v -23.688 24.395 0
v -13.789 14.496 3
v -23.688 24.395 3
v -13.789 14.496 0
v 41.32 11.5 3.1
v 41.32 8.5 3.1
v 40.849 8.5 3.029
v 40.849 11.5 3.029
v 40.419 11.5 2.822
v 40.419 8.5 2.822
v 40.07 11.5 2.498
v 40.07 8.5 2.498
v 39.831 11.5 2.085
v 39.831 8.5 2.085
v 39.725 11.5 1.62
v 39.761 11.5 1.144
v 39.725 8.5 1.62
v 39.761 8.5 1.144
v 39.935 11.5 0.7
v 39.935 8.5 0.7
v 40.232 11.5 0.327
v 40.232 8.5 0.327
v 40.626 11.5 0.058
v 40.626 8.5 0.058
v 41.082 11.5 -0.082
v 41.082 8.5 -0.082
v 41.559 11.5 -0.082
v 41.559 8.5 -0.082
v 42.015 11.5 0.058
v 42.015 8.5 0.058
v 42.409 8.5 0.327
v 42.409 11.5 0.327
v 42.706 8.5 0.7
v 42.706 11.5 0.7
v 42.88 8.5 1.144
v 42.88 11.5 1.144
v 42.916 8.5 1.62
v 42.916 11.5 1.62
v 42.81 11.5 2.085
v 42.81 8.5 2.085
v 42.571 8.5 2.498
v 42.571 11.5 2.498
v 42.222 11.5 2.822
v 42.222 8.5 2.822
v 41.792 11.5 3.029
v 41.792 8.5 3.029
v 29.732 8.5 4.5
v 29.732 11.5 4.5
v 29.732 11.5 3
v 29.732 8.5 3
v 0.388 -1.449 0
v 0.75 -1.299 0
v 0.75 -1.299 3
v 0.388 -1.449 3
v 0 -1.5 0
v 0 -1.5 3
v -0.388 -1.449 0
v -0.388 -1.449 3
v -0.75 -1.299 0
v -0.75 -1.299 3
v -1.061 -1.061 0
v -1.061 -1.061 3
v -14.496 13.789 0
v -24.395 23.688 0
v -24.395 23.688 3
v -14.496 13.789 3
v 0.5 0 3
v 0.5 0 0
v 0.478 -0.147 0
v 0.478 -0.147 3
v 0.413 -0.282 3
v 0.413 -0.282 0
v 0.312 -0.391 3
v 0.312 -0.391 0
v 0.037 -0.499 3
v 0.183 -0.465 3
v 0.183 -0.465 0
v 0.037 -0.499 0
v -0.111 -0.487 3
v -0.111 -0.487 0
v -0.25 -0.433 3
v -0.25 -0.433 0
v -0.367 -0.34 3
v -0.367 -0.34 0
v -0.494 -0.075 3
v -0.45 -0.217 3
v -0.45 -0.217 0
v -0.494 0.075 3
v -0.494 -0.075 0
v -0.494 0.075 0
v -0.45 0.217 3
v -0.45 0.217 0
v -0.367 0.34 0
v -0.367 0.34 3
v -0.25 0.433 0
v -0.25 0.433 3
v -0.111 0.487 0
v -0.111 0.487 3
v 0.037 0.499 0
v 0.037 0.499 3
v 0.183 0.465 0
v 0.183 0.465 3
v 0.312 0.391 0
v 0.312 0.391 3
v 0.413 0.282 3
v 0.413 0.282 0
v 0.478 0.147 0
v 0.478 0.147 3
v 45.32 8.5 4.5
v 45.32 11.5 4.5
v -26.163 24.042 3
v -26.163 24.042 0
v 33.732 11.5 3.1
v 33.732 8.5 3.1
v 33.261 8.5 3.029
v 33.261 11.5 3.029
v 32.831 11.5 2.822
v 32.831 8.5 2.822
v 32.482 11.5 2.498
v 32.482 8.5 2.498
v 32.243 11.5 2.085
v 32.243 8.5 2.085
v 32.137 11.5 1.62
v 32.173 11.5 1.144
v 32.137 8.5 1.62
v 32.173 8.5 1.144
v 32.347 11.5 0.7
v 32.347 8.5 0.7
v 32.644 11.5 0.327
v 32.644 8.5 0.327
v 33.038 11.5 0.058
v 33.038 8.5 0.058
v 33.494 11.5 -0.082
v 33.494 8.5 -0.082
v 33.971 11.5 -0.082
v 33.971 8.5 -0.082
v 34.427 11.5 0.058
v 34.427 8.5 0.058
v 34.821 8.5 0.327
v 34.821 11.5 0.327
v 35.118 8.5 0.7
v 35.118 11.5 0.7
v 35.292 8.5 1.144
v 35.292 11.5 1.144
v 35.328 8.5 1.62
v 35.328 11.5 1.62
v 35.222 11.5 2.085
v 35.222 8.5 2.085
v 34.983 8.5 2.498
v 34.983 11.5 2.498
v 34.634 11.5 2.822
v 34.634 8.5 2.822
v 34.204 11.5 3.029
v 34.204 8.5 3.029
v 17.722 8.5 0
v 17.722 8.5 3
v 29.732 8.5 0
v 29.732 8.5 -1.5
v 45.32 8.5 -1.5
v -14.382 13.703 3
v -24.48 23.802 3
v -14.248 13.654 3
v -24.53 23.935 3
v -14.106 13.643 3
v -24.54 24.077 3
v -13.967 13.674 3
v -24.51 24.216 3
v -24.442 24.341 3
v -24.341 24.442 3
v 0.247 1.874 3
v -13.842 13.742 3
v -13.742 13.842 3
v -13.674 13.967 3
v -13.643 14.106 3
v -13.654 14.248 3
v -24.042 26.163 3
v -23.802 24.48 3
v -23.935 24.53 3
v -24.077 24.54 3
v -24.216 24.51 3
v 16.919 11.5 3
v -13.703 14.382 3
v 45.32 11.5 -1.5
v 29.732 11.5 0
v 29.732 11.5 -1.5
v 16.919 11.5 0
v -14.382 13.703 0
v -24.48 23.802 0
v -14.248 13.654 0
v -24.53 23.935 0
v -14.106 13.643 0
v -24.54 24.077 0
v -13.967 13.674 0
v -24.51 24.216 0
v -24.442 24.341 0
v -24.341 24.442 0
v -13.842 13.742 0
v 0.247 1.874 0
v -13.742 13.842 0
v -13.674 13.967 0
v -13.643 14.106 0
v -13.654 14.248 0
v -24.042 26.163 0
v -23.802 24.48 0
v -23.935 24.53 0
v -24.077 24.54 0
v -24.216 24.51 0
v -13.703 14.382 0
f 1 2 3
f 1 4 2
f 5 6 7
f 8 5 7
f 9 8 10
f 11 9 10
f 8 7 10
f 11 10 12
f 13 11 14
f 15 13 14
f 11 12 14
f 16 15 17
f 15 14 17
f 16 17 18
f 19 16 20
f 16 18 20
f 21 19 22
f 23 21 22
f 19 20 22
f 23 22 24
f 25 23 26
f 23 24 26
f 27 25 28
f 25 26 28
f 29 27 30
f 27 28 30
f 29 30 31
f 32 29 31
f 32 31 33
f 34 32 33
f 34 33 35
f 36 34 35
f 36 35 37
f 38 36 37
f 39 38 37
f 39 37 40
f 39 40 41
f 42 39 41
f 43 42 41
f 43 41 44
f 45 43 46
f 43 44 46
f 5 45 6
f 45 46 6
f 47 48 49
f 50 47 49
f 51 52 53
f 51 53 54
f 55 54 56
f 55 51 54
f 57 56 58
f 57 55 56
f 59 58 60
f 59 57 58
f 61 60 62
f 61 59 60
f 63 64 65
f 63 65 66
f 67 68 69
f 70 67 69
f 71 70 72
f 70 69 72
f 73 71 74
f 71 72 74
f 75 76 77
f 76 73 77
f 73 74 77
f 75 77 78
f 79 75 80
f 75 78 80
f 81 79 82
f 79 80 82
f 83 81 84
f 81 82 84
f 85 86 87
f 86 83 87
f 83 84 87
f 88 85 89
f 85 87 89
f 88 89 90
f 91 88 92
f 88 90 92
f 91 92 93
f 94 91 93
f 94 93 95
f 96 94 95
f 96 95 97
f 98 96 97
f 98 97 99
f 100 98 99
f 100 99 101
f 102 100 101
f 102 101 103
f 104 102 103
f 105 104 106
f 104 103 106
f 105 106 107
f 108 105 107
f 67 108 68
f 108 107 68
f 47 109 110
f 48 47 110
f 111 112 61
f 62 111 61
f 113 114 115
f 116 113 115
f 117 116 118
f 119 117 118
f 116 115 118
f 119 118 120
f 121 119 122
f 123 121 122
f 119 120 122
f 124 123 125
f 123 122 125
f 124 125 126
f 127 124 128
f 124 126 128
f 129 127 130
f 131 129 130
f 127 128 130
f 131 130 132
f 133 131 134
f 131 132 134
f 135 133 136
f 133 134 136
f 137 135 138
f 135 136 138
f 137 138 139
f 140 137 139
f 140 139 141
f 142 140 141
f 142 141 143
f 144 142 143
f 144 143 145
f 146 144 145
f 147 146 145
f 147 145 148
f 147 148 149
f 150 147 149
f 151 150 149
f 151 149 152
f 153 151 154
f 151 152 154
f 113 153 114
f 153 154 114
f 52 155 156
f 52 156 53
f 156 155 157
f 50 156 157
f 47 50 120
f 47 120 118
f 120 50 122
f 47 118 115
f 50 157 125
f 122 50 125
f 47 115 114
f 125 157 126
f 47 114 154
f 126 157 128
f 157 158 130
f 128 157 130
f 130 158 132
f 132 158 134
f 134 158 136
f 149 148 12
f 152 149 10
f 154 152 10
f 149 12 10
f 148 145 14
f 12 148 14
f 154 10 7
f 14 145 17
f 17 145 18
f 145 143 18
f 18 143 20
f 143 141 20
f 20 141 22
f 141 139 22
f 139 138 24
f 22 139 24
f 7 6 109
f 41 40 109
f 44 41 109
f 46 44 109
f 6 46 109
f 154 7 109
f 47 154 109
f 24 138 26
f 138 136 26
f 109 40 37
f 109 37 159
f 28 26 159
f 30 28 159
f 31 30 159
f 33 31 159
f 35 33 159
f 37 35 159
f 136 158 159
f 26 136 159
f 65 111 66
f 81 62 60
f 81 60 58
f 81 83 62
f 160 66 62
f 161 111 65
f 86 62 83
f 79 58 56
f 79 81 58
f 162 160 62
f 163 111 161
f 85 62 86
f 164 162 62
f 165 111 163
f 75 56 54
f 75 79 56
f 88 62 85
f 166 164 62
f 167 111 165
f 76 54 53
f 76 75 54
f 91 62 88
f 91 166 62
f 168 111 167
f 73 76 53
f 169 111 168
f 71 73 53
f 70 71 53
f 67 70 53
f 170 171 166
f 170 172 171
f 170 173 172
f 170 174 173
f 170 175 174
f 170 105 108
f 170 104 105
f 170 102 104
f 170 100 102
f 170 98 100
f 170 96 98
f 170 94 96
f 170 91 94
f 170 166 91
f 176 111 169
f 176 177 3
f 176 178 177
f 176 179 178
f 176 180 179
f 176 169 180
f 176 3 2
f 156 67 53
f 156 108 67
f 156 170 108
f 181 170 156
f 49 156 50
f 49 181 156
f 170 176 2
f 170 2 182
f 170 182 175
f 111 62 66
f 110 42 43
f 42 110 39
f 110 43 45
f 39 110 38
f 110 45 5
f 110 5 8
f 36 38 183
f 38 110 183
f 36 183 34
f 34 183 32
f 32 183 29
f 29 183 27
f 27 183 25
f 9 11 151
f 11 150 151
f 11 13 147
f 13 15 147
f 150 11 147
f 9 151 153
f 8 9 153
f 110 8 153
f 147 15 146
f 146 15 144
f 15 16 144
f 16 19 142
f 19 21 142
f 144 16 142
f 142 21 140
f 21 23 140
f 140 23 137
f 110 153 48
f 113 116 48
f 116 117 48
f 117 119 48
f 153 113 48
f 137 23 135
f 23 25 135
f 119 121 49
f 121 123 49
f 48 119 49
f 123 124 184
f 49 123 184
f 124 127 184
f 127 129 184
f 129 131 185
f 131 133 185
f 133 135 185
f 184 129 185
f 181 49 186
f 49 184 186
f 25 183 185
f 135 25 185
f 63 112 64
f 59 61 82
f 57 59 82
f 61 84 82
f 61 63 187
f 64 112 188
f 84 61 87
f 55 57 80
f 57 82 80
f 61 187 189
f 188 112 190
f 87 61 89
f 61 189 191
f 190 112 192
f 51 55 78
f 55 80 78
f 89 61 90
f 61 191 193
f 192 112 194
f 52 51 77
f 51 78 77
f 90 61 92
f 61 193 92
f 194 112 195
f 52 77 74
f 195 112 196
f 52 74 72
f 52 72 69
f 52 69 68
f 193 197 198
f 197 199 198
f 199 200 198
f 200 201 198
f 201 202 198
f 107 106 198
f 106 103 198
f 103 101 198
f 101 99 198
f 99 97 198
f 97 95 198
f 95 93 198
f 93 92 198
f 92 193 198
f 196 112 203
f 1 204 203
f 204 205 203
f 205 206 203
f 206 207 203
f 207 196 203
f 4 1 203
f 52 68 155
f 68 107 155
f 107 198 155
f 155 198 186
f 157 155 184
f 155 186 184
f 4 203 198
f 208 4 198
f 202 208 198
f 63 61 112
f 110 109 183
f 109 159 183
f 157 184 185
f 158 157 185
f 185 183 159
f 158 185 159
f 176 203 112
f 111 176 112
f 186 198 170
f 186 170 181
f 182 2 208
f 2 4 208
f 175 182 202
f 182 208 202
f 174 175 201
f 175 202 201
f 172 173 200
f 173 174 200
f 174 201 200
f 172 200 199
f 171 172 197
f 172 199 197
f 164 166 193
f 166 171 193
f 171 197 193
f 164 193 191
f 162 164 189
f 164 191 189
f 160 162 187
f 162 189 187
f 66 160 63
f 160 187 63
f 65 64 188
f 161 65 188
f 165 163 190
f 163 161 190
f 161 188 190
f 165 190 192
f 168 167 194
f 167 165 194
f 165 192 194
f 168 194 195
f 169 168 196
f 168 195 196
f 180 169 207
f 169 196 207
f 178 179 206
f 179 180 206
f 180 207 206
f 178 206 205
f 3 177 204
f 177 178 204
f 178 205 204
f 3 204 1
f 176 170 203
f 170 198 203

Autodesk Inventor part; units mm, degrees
ref_plane "YZ Plane" through (0, 0, 0) normal (1, 0, 0) x (0, 1, 0)
ref_plane "XZ Plane" through (0, 0, 0) normal (0, 1, 0) x (-1, 0, 0)
ref_plane "XY Plane" through (0, 0, 0) normal (0, 0, 1) x (1, 0, 0)
sketch "Sketch1" plane through (0, 0, 0) normal (0, 0, 1) x (1, 0, 0)
  line L0 (37.3205, 11.5) -> (16.9186, 11.5)
  line L1 (-26.163, 24.0416) -> (-1.0607, -1.0607)
  line L2 (17.7224, 8.5) -> (0.75, -1.299)
  line L3 (17.7224, 8.5) -> (37.3205, 8.5)
  line L4 (0.2468, 1.8745) -> (16.9186, 11.5)
  line L5 (0.2468, 1.8745) -> (-24.0416, 26.163)
  arc A0 (-23.6881, 24.3952) -> (-24.3952, 23.6881) centre (-24.0416, 24.0416) ccw
  arc A1 (-14.4957, 13.7886) -> (-13.7886, 14.4957) centre (-14.1421, 14.1421) ccw
  circle A2 centre (0, 0) radius 0.5
  line L6 (-25.1023, 25.1023) -> (-26.163, 24.0416)
  line L7 (-24.0416, 26.163) -> (-25.1023, 25.1023)
  line L8 (-24.3952, 23.6881) -> (-14.4957, 13.7886)
  line L9 (-13.7886, 14.4957) -> (-23.6881, 24.3952)
  line L10 (37.3205, 8.5) -> (45.3205, 8.5)
  line L11 (45.3205, 8.5) -> (45.3205, 11.5)
  line L12 (45.3205, 11.5) -> (37.3205, 11.5)
  arc A3 (-1.0607, -1.0607) -> (0.75, -1.299) centre (0, 0) ccw
extrude "Extrusion1" add sketch "Sketch1" along normal blind 3
sketch "Sketch5" plane through (0, 0, 3) normal (0, 0, 1) x (1, 0, 0)
  point P0 (0, 0)
sketch "Sketch8" plane through (45.3205, 8.5, 0) normal (1, 0, 0) x (0, 0, -1)
  line L0 (0, 0) -> (-3, 0) projected
  line L1 (-3, 0) -> (-4.5, 0)
  line L2 (-4.5, 0) -> (-4.5, 3)
  line L3 (-4.5, 3) -> (1.5, 3)
  line L4 (1.5, 3) -> (1.5, 0)
  line L5 (1.5, 0) -> (-3, 0)
  point P0 (0, -8.5)
  dimension "d38" = 1.5
  dimension "d39" = 3
  dimension "d40" = 6
  dimension "d41" = 3
extrude "Extrusion4" add sketch "Sketch8" against normal blind 15.588
sketch "Sketch9" plane through (16.9186, 11.5, 3) normal (0, 1, 0) x (1, 0, 0)
  line L0 (28.4019, 4.5) -> (28.4019, -1.5) construction
  point P0 (-16.9186, 3)
  point P1 (24.4019, 1.5)
  point P2 (16.8139, 1.5)
hole "Hole2" at (41.3205, 11.5, 1.5) at (33.7325, 11.5, 1.5) direction (0, -1, 0) diameter 3.2 end through all clearance for "Hex Head Cap Screw ISO 24017" size "M3" standard "ISO"
properties part number "Ramię♥" material "Stainless Steel, Austenitic"
